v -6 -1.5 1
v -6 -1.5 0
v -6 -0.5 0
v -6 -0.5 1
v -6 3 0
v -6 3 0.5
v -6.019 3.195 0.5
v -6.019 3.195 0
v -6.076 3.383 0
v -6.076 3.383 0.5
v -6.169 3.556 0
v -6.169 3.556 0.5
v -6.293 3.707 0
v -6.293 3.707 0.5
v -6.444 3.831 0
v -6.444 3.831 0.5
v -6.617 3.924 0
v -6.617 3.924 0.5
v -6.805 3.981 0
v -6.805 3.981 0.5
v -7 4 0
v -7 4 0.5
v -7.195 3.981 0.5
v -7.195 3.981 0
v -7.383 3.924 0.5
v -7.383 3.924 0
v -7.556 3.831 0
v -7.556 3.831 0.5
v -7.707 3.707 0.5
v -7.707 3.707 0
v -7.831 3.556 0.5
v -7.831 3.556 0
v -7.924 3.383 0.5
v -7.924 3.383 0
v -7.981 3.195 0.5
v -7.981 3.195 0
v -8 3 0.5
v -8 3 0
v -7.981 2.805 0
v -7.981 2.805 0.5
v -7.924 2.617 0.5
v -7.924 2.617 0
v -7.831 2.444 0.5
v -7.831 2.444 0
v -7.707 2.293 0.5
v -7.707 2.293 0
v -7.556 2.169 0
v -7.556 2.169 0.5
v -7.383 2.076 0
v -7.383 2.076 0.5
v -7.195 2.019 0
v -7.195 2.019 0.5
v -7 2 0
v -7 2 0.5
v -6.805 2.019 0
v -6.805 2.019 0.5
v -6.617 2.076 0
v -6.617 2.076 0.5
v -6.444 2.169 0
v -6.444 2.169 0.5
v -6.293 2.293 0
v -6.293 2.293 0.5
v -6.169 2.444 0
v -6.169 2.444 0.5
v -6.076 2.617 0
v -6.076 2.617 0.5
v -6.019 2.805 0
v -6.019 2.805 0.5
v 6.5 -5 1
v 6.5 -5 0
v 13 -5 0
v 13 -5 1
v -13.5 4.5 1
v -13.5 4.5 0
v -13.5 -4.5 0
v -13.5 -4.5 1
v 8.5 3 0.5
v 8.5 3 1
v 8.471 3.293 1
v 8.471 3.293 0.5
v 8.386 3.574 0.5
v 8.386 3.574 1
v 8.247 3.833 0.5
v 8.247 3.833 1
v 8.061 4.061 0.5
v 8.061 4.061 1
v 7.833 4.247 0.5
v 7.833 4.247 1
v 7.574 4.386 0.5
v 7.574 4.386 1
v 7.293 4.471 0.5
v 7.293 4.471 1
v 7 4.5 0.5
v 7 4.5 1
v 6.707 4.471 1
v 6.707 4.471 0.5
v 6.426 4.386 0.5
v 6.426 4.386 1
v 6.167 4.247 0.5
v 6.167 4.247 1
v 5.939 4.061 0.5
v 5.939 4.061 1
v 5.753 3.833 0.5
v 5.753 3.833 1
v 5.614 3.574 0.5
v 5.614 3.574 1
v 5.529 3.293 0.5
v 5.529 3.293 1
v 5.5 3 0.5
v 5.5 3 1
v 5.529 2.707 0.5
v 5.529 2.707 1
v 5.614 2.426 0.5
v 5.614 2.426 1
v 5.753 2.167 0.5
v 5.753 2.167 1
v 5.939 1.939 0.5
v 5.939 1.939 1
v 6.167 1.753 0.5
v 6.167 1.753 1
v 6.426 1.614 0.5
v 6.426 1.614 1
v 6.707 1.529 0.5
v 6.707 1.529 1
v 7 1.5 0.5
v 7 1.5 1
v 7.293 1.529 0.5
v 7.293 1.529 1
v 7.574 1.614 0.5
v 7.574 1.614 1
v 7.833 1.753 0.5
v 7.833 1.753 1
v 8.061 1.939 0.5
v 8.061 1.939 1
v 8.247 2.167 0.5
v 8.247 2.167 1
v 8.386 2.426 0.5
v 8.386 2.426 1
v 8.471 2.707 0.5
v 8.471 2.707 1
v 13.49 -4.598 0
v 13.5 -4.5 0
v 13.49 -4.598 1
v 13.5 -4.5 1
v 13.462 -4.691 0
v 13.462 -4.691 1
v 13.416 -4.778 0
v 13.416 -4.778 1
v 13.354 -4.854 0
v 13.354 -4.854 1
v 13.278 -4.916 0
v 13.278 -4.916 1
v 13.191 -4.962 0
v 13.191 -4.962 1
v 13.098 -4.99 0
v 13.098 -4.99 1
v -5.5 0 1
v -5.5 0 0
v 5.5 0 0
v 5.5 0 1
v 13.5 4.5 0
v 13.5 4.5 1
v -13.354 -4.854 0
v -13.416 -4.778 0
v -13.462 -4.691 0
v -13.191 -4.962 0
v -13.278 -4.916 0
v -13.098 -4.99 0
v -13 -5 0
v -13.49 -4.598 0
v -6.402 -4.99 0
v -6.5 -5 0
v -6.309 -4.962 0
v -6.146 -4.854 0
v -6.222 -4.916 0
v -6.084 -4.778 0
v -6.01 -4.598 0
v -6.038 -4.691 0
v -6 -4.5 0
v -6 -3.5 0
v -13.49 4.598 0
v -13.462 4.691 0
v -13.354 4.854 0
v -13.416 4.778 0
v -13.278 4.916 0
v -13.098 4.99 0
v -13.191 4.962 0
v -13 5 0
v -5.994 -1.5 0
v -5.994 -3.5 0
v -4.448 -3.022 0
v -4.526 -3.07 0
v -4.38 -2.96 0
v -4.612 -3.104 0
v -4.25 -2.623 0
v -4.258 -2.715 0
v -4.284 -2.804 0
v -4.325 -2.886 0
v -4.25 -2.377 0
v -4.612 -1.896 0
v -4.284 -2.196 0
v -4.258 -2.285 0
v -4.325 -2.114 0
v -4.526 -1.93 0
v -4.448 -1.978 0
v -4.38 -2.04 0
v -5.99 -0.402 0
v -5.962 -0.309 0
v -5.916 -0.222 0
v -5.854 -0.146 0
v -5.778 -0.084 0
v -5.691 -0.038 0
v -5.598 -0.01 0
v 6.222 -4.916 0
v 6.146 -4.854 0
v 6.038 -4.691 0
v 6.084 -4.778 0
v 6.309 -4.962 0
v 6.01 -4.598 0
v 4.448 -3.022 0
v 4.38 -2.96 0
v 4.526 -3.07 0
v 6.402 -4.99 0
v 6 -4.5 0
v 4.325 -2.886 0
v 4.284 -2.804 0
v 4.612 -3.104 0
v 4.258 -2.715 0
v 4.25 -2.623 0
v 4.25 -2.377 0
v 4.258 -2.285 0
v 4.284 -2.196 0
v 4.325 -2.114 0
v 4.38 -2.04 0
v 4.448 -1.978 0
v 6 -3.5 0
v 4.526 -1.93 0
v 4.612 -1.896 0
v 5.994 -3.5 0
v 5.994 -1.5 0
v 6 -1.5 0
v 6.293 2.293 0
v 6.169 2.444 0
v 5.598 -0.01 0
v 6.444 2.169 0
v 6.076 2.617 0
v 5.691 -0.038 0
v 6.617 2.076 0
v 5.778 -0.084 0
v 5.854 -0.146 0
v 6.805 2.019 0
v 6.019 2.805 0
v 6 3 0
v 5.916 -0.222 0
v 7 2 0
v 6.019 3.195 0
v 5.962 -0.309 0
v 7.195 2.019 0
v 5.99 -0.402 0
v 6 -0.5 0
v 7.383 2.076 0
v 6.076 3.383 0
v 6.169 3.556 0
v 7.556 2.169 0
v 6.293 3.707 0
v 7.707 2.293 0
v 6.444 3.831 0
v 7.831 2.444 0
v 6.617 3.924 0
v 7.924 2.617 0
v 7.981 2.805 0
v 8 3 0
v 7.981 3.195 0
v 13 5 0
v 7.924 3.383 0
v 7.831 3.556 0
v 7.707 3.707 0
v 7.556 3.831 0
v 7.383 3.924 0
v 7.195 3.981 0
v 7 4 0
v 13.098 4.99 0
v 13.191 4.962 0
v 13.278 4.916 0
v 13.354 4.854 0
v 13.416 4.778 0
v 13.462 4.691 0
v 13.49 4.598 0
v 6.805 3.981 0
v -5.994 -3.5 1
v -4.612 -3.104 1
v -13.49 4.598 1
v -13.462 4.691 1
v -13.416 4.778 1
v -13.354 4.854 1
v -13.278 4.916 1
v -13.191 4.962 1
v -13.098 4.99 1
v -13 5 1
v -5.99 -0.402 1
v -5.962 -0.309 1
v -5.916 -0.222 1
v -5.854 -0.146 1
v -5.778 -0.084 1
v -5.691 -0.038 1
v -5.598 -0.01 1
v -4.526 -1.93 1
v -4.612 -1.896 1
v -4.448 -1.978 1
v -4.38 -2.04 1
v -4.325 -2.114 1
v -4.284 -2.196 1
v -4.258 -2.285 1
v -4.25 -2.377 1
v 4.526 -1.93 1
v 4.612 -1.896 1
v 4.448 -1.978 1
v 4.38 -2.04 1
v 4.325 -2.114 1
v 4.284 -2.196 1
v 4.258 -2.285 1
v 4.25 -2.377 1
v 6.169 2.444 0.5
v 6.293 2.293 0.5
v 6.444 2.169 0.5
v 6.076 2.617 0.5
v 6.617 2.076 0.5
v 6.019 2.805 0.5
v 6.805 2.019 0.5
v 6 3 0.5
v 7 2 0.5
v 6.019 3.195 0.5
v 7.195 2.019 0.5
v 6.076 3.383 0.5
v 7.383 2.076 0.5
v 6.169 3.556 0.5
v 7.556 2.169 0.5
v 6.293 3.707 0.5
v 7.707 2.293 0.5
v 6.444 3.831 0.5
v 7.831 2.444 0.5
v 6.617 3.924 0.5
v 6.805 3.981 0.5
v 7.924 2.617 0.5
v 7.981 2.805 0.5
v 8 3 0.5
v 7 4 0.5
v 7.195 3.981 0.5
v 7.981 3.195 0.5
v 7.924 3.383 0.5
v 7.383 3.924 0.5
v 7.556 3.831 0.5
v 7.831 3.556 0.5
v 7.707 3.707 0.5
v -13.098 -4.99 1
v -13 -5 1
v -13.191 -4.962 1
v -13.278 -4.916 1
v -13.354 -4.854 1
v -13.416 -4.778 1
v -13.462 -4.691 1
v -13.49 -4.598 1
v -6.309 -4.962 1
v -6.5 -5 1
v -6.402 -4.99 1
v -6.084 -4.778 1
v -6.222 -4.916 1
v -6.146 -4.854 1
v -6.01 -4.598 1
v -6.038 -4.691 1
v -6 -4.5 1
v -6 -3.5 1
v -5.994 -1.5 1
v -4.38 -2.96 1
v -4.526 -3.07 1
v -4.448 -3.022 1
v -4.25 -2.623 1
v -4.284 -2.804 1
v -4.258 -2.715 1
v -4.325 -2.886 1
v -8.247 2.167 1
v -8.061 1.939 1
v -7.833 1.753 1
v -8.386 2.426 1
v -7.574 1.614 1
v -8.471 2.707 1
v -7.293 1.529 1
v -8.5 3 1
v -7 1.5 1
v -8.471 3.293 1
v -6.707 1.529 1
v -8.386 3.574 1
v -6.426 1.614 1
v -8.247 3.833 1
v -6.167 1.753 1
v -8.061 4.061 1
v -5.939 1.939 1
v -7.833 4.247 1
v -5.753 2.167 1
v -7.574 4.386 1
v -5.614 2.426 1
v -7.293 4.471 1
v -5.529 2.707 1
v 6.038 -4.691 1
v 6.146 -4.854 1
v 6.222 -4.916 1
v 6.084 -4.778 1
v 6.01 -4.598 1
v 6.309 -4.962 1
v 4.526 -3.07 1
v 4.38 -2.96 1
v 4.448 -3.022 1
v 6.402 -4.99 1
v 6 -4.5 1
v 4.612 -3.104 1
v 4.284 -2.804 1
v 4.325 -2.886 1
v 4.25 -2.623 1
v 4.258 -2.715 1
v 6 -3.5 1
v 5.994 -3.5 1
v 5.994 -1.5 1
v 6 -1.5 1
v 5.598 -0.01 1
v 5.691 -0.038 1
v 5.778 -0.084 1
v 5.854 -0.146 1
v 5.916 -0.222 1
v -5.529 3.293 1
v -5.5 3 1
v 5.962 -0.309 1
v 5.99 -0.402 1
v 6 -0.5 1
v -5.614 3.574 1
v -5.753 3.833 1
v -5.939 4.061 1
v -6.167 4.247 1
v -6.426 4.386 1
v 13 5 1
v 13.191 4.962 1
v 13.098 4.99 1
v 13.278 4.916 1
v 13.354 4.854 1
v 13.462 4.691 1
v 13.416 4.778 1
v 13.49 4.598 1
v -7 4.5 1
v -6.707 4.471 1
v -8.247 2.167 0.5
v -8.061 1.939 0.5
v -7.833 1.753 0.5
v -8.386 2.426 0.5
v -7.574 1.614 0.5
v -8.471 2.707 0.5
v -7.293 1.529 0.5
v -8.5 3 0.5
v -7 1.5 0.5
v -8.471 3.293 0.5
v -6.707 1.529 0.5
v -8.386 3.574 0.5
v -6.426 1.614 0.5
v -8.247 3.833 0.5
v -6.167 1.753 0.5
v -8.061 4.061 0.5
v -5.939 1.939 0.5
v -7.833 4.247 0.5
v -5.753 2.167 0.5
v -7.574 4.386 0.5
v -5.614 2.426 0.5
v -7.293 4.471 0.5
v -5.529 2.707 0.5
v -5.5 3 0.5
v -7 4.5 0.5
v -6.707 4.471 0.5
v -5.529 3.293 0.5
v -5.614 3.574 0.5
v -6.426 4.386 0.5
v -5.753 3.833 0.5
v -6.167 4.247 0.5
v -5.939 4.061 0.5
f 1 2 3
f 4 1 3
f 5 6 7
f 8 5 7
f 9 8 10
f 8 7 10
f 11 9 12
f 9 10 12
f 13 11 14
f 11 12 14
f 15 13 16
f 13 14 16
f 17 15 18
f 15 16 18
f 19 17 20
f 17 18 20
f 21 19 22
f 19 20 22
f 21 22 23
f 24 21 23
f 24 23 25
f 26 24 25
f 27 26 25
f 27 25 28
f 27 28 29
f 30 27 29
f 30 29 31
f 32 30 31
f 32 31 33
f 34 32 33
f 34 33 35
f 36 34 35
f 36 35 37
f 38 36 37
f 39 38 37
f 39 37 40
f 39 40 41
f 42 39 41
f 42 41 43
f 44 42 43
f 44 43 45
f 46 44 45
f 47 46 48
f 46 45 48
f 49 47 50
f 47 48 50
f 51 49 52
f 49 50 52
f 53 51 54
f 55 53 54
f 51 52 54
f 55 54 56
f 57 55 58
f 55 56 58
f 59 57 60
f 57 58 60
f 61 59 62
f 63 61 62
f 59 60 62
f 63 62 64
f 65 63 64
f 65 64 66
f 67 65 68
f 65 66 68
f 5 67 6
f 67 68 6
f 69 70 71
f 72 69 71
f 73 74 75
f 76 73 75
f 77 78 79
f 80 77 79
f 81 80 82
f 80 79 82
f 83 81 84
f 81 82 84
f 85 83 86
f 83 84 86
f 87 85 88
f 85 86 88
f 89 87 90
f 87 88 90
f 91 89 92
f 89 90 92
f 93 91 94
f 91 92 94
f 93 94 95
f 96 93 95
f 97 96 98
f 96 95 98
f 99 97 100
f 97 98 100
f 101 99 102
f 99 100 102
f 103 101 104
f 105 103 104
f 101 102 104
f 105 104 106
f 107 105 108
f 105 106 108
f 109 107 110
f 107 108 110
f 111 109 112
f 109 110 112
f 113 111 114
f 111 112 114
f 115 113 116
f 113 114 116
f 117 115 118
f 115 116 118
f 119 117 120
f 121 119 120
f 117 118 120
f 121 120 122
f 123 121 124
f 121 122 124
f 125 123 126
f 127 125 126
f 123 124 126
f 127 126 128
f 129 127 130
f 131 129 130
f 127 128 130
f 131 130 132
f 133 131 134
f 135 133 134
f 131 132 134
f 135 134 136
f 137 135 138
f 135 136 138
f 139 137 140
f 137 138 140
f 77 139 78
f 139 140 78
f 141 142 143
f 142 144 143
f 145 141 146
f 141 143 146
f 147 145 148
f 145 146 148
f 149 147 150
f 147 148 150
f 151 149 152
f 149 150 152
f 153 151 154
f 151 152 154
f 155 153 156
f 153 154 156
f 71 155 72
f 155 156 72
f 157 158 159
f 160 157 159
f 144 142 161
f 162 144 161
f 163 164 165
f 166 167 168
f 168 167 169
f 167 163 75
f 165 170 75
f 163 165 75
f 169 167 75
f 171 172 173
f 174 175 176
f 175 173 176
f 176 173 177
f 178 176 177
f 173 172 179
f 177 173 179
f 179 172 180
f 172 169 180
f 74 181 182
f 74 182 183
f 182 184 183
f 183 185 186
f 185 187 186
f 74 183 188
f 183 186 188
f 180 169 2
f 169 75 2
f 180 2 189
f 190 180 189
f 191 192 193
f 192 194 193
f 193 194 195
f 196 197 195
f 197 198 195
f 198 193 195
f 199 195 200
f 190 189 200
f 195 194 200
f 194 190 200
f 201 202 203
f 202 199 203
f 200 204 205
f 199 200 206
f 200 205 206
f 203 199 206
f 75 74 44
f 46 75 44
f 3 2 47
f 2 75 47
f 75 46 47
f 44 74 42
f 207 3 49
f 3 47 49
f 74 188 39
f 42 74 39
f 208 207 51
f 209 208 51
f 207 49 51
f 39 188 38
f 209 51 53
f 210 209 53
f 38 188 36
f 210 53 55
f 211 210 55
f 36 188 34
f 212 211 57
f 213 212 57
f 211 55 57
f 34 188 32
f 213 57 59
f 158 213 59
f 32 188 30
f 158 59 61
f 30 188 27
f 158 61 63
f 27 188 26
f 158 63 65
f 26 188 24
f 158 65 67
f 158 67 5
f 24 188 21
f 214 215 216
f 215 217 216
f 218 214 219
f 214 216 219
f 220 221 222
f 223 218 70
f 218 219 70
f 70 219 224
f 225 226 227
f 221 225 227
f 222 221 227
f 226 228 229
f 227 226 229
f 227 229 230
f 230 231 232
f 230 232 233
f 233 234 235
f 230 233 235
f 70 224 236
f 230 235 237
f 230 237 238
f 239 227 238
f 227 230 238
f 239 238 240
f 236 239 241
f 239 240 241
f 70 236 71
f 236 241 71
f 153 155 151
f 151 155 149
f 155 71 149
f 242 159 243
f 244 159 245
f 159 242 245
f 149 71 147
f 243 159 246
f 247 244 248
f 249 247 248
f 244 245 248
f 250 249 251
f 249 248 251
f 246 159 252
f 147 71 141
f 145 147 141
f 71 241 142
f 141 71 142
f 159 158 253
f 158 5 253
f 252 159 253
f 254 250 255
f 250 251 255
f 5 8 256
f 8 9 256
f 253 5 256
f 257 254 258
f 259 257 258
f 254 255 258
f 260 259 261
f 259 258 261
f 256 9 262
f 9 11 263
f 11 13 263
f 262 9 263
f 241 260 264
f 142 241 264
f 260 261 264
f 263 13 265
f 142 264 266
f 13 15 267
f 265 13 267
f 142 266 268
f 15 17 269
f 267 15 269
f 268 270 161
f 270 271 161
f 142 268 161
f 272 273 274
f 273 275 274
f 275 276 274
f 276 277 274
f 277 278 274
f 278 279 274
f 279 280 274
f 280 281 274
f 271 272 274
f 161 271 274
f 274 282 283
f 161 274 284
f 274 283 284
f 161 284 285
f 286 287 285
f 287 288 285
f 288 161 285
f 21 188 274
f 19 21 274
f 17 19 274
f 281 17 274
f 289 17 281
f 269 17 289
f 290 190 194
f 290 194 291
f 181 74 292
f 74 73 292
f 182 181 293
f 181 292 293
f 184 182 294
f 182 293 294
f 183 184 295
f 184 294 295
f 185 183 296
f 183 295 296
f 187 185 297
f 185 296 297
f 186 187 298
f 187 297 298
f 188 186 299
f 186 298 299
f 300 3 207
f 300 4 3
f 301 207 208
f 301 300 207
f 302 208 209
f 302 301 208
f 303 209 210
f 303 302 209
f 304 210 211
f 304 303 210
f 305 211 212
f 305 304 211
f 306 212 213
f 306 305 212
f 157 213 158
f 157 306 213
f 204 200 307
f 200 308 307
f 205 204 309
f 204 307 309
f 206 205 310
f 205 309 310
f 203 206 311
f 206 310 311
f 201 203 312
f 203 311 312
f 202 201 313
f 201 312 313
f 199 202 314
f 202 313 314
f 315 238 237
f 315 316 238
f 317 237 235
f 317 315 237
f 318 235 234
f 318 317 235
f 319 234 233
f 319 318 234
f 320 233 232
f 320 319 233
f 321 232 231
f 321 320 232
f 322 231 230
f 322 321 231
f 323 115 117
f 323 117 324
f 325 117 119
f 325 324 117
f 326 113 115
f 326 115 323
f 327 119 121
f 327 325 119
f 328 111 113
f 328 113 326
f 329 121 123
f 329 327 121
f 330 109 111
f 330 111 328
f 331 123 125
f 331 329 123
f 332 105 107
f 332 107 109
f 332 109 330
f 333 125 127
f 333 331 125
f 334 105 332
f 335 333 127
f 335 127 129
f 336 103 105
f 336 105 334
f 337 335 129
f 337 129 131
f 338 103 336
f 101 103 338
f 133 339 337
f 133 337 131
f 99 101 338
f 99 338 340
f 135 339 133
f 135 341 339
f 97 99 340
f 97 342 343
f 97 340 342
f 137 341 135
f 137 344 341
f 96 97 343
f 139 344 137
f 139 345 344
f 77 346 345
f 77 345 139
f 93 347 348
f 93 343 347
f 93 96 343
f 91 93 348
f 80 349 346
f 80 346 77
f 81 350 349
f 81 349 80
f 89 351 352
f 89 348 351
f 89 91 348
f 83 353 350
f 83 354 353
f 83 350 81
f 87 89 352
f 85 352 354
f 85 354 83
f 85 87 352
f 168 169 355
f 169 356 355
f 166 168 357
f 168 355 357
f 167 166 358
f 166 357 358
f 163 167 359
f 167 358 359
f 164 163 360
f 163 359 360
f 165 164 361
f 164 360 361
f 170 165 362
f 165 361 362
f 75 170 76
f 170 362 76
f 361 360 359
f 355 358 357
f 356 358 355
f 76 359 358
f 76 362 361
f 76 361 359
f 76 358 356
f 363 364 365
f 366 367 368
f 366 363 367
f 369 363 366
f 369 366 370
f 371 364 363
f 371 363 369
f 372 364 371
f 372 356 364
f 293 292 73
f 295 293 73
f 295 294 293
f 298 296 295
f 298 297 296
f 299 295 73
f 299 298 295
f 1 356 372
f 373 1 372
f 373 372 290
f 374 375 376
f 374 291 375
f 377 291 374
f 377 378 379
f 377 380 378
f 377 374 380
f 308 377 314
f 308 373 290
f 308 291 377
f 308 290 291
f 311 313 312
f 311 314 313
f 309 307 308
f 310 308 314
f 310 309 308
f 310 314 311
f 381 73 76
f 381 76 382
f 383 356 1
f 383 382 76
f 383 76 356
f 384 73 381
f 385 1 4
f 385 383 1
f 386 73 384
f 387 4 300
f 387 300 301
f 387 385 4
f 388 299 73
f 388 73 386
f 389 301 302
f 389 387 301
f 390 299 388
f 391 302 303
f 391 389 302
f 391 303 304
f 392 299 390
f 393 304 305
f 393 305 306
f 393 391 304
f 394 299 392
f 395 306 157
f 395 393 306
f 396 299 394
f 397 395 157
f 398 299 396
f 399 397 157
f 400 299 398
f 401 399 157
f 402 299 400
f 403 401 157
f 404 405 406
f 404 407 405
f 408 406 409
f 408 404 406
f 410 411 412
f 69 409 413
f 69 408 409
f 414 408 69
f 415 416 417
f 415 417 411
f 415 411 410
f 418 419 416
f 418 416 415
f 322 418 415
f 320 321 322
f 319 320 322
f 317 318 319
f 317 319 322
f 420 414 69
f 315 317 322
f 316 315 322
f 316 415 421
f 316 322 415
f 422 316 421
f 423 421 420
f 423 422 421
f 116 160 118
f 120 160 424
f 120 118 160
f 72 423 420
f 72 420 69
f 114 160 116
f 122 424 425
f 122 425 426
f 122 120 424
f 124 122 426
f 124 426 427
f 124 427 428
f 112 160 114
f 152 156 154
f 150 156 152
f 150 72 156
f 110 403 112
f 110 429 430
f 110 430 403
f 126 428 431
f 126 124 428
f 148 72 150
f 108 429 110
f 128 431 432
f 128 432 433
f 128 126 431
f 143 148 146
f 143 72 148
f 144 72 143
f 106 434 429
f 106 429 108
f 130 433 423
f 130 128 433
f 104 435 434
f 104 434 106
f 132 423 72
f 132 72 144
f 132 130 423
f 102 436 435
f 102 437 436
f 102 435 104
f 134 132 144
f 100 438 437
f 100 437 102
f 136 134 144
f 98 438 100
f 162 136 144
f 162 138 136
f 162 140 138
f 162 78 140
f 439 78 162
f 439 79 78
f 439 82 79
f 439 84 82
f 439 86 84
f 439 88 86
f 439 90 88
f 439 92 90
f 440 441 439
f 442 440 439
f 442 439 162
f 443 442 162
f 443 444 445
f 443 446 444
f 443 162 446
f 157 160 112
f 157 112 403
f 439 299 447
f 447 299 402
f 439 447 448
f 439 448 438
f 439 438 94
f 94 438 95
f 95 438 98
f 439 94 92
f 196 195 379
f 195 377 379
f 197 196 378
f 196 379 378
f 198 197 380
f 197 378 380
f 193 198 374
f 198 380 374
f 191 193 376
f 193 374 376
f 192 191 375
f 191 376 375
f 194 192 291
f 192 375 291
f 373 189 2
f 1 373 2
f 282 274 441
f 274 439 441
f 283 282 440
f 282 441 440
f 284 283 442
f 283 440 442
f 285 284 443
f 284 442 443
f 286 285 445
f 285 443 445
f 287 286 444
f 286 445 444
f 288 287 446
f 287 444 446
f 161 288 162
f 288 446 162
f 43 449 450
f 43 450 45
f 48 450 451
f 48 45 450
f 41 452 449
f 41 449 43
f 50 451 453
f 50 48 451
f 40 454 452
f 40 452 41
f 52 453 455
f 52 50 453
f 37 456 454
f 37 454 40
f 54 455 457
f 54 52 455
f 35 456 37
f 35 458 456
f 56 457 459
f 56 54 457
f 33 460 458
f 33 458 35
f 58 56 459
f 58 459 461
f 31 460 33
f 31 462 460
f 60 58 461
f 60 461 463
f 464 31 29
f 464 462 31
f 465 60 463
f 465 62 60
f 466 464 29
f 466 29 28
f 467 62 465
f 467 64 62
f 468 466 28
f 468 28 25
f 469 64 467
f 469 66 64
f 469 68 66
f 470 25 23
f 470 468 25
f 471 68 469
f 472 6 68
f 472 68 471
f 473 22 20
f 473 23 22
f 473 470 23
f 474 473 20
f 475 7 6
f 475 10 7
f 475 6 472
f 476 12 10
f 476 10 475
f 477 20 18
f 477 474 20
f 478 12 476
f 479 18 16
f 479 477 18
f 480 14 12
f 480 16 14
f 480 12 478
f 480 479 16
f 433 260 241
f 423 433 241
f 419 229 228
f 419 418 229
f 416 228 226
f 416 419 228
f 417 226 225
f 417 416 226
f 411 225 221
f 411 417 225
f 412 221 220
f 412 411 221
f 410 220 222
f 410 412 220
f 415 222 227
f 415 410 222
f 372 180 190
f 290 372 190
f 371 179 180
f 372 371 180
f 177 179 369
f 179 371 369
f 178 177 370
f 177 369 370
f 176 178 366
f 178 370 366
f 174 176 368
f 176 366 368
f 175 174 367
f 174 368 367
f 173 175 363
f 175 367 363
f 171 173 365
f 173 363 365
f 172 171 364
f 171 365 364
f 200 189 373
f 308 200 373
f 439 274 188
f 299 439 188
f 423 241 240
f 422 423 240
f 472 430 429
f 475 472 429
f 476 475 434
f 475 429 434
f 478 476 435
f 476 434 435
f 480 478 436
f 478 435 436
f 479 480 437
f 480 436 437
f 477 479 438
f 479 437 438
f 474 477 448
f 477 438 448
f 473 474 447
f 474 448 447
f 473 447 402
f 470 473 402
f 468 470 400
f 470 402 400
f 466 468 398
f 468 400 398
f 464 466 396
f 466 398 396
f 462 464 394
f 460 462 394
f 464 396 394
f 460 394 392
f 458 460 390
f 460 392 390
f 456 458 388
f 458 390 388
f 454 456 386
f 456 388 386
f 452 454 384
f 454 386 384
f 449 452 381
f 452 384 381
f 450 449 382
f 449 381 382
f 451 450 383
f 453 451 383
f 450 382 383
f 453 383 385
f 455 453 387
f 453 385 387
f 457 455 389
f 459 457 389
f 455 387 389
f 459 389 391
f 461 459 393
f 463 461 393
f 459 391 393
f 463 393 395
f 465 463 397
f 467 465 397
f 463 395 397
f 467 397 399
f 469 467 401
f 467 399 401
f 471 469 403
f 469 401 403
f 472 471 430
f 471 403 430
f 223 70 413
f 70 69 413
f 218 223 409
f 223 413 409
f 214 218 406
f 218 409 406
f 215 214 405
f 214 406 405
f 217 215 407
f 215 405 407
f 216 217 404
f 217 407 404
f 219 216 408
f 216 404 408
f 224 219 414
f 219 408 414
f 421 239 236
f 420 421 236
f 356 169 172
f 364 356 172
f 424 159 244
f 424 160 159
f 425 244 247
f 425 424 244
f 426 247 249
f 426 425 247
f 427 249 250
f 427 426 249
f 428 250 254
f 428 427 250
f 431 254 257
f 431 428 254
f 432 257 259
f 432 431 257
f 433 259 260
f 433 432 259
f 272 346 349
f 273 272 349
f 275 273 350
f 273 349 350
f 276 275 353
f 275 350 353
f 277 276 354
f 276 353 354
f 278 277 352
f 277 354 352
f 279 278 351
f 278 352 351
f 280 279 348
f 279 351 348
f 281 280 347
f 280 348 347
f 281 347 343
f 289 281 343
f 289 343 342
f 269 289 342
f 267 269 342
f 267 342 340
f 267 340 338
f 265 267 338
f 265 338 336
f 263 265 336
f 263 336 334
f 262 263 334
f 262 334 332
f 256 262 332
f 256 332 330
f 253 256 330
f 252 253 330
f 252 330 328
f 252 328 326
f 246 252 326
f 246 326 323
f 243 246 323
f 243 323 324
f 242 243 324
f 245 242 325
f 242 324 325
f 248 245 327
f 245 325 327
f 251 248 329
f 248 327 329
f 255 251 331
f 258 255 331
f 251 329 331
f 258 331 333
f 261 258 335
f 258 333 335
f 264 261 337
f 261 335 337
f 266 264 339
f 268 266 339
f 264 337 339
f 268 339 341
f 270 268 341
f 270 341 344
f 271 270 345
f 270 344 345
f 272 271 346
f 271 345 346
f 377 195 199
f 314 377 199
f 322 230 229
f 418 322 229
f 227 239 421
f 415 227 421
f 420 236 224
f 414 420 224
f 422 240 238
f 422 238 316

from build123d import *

# Parameters (mm, degrees)
BOSS_EXTRUDE1_DEPTH   = 1
CHAMFER1_SIZE         = 0.5
CHAMFER1_SIZE2        = 1.743707222
CHAMFER1_PART_2_SIZE  = 0.5
CHAMFER1_PART_2_SIZE2 = 1.743707222
FILLET1_R             = 0.5
SKETCH2_R             = 1
CUT_EXTRUDE1_DEPTH    = 1
FILLET2_R             = 0.5
SKETCH3_R             = 1.5
CUT_EXTRUDE2_DEPTH    = 0.5


with BuildPart() as part:
    # Sketch1 → Boss-Extrude1 (new body)
    with BuildSketch(Plane.XY):
        Polygon((-6, -1.5), (-6, 0), (6, 0), (6, -1.5), (4.25, -1.5), (4.25, -3.5), (6, -3.5), (6, -5), (13.5, -5), (13.5, 5), (-13.5, 5), (-13.5, -5), (-6, -5), (-6, -3.5), (-4.25, -3.5), (-4.25, -1.5), align=None)
    extrude(amount=BOSS_EXTRUDE1_DEPTH)

    # Chamfer1
    chamfer1_edges = [part.edges().sort_by_distance(p)[0] for p in [
        (4.25, -3.5, 0.5),
        (4.25, -1.5, 0.5),
    ]]
    chamfer1_side = [part.faces().sort_by_distance(p)[0] for p in [
        (4.25, -2.5, 0.5),
    ]]
    chamfer(chamfer1_edges, length=CHAMFER1_SIZE, length2=CHAMFER1_SIZE2, reference=chamfer1_side[0])

    # Chamfer1 part 2
    chamfer1_part_2_edges = [part.edges().sort_by_distance(p)[0] for p in [
        (-4.25, -1.5, 0.5),
        (-4.25, -3.5, 0.5),
    ]]
    chamfer1_part_2_side = [part.faces().sort_by_distance(p)[0] for p in [
        (-4.25, -2.5, 0.5),
    ]]
    chamfer(chamfer1_part_2_edges, length=CHAMFER1_PART_2_SIZE, length2=CHAMFER1_PART_2_SIZE2, reference=chamfer1_part_2_side[0])

    # Fillet1
    fillet1_edges = [part.edges().sort_by_distance(p)[0] for p in [
        (4.25, -2, 0.5),
        (4.25, -3, 0.5),
        (-4.25, -2, 0.5),
        (-4.25, -3, 0.5),
    ]]
    fillet(fillet1_edges, radius=FILLET1_R)

    # Sketch2 → Cut-Extrude1 (cut)
    with BuildSketch(Plane.XY.offset(1)):
        with Locations((-7, 3)):
            Circle(SKETCH2_R)
        with Locations((7, 3)):
            Circle(SKETCH2_R)
    extrude(amount=-CUT_EXTRUDE1_DEPTH, mode=Mode.SUBTRACT)

    # Fillet2
    fillet2_edges = [part.edges().sort_by_distance(p)[0] for p in [
        (6, -5, 0.5),
        (6, 0, 0.5),
        (-6, 0, 0.5),
        (-6, -5, 0.5),
        (-13.5, -5, 0.5),
        (-13.5, 5, 0.5),
        (13.5, 5, 0.5),
        (13.5, -5, 0.5),
    ]]
    fillet(fillet2_edges, radius=FILLET2_R)

    # Sketch3 → Cut-Extrude2 (cut)
    with BuildSketch(Plane.XY.offset(1)):
        with Locations((-7, 3)):
            Circle(SKETCH3_R)
        with Locations((7, 3)):
            Circle(SKETCH3_R)
    extrude(amount=-CUT_EXTRUDE2_DEPTH, mode=Mode.SUBTRACT)


solid = part.part
